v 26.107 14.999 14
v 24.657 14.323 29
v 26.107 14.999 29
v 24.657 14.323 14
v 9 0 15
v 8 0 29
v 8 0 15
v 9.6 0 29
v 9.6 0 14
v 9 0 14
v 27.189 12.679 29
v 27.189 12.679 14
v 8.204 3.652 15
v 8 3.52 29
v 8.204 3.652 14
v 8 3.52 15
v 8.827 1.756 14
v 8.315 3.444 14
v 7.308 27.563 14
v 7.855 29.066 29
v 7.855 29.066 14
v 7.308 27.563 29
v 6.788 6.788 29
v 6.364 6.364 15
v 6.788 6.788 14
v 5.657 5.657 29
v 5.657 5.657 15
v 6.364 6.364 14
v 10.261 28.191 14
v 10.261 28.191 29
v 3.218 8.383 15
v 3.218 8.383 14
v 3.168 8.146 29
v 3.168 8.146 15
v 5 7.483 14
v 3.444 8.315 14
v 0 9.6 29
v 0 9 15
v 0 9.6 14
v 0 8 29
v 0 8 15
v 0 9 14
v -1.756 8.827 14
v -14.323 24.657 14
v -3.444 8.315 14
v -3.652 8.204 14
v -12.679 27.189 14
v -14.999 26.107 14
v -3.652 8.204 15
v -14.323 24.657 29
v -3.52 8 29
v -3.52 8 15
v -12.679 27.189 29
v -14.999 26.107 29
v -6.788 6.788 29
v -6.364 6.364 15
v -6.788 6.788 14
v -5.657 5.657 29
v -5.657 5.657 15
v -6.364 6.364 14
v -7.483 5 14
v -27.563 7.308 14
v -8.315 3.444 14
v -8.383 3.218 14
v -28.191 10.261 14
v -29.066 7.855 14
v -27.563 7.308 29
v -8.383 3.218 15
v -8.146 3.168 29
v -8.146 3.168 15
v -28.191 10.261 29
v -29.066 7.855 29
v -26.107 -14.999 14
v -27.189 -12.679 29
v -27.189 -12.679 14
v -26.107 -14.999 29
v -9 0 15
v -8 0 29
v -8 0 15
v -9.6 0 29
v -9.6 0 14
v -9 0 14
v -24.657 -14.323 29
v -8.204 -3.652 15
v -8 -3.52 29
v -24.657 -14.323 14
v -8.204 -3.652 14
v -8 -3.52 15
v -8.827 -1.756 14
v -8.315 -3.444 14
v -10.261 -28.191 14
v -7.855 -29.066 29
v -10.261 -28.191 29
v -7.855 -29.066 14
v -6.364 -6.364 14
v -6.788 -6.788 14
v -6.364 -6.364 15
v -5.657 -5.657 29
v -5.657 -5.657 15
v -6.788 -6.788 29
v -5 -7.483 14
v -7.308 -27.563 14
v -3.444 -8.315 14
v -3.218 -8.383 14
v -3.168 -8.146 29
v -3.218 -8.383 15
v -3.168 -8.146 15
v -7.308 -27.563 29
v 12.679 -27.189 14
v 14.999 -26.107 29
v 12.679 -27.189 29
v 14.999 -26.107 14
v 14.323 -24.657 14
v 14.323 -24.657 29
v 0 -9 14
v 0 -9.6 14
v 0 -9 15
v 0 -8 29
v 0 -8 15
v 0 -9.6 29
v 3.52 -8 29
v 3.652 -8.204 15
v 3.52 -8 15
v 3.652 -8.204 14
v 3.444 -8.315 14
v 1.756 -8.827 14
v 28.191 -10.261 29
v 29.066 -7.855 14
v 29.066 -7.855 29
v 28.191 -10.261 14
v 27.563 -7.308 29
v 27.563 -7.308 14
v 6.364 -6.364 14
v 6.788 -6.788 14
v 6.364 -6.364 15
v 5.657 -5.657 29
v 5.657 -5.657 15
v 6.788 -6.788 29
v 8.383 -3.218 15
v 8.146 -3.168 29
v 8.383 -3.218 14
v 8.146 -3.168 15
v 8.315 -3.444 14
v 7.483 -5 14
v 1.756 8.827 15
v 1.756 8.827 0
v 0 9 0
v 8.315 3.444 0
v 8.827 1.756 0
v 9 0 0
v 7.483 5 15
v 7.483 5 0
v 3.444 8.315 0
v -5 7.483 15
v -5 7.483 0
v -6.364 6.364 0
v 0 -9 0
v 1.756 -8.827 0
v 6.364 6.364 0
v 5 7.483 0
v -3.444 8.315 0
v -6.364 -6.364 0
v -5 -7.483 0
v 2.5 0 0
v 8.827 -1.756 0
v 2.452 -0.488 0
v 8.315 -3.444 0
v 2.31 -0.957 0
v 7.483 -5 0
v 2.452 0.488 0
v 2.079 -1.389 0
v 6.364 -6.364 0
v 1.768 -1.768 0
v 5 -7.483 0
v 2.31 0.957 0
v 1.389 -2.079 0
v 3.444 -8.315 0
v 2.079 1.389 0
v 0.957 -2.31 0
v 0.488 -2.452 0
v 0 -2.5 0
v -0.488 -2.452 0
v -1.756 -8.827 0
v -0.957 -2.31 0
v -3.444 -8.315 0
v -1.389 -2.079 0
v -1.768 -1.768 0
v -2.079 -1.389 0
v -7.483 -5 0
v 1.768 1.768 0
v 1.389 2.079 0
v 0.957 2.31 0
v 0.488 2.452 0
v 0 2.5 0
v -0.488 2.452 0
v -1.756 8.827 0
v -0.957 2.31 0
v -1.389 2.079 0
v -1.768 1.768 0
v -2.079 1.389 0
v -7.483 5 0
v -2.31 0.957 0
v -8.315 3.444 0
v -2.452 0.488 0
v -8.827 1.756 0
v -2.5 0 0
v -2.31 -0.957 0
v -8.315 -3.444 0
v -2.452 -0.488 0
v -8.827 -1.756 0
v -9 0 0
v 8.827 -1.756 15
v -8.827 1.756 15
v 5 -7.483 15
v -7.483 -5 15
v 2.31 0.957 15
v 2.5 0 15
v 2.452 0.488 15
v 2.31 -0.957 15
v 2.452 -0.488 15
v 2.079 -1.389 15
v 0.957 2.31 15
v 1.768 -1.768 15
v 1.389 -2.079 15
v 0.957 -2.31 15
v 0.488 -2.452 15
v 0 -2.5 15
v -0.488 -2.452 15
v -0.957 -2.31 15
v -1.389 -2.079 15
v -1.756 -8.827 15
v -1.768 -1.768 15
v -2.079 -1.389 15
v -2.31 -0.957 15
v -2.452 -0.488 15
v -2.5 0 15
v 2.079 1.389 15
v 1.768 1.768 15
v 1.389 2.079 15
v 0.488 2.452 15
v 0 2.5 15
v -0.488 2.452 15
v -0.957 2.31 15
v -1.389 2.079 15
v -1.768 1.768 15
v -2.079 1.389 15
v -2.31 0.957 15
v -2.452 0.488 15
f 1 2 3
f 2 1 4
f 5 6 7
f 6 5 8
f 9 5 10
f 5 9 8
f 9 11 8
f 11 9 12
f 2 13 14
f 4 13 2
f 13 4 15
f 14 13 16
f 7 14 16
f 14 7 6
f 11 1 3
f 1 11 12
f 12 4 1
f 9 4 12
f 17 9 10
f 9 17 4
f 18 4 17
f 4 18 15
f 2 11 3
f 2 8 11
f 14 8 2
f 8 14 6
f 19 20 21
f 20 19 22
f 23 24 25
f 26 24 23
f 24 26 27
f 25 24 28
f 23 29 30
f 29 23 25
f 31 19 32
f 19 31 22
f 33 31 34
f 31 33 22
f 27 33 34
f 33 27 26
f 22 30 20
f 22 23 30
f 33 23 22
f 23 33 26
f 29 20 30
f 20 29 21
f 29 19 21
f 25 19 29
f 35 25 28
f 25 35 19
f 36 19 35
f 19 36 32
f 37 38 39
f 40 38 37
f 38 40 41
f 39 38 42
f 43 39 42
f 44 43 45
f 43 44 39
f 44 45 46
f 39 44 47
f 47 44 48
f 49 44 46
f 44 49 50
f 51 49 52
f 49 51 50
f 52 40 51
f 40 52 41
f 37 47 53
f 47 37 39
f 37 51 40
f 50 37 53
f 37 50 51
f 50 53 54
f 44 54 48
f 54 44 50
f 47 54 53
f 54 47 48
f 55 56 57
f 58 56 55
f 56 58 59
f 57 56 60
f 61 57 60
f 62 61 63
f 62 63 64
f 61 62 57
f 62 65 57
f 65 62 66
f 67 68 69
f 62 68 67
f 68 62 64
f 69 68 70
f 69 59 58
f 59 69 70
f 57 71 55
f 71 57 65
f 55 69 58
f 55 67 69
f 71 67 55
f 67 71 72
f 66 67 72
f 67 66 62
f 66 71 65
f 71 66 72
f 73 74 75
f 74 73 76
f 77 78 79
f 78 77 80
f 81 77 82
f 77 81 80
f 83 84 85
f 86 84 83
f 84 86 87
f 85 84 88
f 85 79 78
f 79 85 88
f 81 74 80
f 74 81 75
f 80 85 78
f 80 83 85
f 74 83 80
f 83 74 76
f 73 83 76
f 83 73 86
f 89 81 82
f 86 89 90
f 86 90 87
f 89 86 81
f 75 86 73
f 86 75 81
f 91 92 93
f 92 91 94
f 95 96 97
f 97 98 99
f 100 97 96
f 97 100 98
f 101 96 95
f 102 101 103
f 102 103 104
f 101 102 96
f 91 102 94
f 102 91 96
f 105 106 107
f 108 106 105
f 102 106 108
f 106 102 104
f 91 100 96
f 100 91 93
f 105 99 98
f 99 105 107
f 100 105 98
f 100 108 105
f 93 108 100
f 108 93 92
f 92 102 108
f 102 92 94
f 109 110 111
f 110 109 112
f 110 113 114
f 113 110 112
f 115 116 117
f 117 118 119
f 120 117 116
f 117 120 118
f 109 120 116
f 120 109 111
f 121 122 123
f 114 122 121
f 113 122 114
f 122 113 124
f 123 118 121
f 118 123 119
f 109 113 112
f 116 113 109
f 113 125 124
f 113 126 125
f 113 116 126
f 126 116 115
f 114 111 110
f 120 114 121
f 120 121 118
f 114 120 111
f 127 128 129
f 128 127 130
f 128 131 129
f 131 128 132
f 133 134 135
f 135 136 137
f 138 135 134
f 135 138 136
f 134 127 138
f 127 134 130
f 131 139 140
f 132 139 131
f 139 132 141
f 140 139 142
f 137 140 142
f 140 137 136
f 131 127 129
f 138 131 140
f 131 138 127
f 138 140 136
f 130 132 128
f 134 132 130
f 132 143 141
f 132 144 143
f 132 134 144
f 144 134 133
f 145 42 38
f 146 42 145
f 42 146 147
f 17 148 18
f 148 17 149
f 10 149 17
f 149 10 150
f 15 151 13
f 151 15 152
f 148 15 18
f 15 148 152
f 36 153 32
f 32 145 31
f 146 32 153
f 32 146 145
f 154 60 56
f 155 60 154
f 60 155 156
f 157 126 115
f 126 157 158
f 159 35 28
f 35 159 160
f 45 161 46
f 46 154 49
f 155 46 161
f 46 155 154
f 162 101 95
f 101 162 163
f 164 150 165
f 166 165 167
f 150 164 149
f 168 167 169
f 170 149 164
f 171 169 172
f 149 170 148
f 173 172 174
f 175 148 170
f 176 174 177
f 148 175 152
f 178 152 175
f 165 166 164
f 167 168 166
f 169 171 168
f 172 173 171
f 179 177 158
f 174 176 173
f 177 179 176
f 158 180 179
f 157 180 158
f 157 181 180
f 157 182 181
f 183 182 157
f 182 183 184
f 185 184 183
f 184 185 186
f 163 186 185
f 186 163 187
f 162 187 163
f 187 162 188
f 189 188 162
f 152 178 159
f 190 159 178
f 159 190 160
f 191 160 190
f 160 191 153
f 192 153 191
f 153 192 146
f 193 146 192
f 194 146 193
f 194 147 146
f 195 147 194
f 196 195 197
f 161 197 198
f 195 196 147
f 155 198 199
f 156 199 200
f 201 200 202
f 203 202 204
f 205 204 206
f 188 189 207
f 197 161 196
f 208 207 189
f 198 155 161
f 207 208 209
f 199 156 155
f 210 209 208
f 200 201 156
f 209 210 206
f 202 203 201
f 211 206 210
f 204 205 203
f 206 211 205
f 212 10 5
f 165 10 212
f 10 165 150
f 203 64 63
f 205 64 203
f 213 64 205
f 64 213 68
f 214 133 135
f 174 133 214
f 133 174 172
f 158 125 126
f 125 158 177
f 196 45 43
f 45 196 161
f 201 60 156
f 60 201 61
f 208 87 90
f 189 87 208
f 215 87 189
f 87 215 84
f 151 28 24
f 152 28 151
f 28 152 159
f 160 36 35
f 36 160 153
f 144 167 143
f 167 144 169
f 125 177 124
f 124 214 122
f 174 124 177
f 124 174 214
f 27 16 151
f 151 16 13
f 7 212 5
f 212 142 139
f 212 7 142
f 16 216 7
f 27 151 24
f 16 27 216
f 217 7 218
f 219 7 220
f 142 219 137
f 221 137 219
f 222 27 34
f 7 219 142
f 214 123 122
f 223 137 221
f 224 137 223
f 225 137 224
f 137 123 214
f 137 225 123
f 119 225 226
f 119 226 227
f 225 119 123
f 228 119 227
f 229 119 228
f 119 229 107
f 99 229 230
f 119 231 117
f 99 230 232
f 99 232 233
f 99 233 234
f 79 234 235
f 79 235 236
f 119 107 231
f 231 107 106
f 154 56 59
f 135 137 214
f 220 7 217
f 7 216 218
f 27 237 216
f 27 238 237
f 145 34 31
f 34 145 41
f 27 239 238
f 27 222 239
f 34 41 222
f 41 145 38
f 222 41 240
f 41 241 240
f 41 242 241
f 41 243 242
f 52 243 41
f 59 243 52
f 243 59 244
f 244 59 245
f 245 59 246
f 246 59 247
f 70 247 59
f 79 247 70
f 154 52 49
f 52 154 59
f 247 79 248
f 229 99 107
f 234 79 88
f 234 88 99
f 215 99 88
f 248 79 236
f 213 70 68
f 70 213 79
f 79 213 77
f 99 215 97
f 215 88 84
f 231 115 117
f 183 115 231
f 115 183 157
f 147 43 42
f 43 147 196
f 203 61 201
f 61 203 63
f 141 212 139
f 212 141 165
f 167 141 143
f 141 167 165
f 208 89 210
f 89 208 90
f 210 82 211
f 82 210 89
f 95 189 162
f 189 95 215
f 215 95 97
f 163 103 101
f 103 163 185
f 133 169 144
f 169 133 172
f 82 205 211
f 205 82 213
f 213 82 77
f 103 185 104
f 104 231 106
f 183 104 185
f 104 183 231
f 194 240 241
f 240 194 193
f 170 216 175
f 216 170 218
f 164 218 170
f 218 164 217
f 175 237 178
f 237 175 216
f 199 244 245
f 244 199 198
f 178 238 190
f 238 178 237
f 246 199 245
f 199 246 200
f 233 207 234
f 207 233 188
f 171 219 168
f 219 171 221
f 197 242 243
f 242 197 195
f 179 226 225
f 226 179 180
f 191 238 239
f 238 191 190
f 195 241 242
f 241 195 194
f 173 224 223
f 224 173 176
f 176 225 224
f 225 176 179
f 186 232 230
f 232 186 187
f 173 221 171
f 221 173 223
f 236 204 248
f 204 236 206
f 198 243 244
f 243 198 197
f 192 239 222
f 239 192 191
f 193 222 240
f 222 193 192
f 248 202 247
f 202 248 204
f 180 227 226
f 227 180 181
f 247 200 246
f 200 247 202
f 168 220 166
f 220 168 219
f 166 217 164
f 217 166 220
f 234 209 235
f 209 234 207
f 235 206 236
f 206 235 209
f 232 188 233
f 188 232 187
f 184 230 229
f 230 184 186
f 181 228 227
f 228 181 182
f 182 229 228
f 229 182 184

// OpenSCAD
$fn = 32;

// ----------------------------------------------------------------------
// Impeller: 60 mm, 8 blades, 29 mm tall
// ----------------------------------------------------------------------

// --- parameters (mm) ---
boss_d = 18;              // hub diameter
boss_h = 15;              // hub height
rotor_d = 60;             // outer diameter over the blades
vane_count = 8;           // number of blades
blade_t = 1.6;            // blade thickness
blade_h = 14;             // blade height
blade_in_r = 8;           // blade root radius
blade_out_r = 28.4;       // blade tip radius
sweep = 25;               // blade sweep, degrees
bore_d = 5;               // shaft bore

module hub() {
  cylinder(h = boss_h, d = boss_d);
}

module blade() {
  /* blade swept between two boxes: hull of the root and the tip section */
  hull() {
    translate([blade_in_r, 0, boss_h - 1])
      cube([blade_t, blade_t * 2.2, blade_h + 1], center = false);
    rotate([0, 0, sweep])
      translate([blade_out_r, 0, boss_h - 1])
        cube([blade_t, blade_t * 1.6, blade_h + 1], center = false);
  }
}

module blades() {
  for (i = [0 : vane_count - 1])
    rotate([0, 0, i * 360 / vane_count]) blade();
}

difference() {
  union() {
    hub();
    blades();
  }
  translate([0, 0, -1]) cylinder(h = boss_h + blade_h + 0 + 3, d = bore_d);
}
